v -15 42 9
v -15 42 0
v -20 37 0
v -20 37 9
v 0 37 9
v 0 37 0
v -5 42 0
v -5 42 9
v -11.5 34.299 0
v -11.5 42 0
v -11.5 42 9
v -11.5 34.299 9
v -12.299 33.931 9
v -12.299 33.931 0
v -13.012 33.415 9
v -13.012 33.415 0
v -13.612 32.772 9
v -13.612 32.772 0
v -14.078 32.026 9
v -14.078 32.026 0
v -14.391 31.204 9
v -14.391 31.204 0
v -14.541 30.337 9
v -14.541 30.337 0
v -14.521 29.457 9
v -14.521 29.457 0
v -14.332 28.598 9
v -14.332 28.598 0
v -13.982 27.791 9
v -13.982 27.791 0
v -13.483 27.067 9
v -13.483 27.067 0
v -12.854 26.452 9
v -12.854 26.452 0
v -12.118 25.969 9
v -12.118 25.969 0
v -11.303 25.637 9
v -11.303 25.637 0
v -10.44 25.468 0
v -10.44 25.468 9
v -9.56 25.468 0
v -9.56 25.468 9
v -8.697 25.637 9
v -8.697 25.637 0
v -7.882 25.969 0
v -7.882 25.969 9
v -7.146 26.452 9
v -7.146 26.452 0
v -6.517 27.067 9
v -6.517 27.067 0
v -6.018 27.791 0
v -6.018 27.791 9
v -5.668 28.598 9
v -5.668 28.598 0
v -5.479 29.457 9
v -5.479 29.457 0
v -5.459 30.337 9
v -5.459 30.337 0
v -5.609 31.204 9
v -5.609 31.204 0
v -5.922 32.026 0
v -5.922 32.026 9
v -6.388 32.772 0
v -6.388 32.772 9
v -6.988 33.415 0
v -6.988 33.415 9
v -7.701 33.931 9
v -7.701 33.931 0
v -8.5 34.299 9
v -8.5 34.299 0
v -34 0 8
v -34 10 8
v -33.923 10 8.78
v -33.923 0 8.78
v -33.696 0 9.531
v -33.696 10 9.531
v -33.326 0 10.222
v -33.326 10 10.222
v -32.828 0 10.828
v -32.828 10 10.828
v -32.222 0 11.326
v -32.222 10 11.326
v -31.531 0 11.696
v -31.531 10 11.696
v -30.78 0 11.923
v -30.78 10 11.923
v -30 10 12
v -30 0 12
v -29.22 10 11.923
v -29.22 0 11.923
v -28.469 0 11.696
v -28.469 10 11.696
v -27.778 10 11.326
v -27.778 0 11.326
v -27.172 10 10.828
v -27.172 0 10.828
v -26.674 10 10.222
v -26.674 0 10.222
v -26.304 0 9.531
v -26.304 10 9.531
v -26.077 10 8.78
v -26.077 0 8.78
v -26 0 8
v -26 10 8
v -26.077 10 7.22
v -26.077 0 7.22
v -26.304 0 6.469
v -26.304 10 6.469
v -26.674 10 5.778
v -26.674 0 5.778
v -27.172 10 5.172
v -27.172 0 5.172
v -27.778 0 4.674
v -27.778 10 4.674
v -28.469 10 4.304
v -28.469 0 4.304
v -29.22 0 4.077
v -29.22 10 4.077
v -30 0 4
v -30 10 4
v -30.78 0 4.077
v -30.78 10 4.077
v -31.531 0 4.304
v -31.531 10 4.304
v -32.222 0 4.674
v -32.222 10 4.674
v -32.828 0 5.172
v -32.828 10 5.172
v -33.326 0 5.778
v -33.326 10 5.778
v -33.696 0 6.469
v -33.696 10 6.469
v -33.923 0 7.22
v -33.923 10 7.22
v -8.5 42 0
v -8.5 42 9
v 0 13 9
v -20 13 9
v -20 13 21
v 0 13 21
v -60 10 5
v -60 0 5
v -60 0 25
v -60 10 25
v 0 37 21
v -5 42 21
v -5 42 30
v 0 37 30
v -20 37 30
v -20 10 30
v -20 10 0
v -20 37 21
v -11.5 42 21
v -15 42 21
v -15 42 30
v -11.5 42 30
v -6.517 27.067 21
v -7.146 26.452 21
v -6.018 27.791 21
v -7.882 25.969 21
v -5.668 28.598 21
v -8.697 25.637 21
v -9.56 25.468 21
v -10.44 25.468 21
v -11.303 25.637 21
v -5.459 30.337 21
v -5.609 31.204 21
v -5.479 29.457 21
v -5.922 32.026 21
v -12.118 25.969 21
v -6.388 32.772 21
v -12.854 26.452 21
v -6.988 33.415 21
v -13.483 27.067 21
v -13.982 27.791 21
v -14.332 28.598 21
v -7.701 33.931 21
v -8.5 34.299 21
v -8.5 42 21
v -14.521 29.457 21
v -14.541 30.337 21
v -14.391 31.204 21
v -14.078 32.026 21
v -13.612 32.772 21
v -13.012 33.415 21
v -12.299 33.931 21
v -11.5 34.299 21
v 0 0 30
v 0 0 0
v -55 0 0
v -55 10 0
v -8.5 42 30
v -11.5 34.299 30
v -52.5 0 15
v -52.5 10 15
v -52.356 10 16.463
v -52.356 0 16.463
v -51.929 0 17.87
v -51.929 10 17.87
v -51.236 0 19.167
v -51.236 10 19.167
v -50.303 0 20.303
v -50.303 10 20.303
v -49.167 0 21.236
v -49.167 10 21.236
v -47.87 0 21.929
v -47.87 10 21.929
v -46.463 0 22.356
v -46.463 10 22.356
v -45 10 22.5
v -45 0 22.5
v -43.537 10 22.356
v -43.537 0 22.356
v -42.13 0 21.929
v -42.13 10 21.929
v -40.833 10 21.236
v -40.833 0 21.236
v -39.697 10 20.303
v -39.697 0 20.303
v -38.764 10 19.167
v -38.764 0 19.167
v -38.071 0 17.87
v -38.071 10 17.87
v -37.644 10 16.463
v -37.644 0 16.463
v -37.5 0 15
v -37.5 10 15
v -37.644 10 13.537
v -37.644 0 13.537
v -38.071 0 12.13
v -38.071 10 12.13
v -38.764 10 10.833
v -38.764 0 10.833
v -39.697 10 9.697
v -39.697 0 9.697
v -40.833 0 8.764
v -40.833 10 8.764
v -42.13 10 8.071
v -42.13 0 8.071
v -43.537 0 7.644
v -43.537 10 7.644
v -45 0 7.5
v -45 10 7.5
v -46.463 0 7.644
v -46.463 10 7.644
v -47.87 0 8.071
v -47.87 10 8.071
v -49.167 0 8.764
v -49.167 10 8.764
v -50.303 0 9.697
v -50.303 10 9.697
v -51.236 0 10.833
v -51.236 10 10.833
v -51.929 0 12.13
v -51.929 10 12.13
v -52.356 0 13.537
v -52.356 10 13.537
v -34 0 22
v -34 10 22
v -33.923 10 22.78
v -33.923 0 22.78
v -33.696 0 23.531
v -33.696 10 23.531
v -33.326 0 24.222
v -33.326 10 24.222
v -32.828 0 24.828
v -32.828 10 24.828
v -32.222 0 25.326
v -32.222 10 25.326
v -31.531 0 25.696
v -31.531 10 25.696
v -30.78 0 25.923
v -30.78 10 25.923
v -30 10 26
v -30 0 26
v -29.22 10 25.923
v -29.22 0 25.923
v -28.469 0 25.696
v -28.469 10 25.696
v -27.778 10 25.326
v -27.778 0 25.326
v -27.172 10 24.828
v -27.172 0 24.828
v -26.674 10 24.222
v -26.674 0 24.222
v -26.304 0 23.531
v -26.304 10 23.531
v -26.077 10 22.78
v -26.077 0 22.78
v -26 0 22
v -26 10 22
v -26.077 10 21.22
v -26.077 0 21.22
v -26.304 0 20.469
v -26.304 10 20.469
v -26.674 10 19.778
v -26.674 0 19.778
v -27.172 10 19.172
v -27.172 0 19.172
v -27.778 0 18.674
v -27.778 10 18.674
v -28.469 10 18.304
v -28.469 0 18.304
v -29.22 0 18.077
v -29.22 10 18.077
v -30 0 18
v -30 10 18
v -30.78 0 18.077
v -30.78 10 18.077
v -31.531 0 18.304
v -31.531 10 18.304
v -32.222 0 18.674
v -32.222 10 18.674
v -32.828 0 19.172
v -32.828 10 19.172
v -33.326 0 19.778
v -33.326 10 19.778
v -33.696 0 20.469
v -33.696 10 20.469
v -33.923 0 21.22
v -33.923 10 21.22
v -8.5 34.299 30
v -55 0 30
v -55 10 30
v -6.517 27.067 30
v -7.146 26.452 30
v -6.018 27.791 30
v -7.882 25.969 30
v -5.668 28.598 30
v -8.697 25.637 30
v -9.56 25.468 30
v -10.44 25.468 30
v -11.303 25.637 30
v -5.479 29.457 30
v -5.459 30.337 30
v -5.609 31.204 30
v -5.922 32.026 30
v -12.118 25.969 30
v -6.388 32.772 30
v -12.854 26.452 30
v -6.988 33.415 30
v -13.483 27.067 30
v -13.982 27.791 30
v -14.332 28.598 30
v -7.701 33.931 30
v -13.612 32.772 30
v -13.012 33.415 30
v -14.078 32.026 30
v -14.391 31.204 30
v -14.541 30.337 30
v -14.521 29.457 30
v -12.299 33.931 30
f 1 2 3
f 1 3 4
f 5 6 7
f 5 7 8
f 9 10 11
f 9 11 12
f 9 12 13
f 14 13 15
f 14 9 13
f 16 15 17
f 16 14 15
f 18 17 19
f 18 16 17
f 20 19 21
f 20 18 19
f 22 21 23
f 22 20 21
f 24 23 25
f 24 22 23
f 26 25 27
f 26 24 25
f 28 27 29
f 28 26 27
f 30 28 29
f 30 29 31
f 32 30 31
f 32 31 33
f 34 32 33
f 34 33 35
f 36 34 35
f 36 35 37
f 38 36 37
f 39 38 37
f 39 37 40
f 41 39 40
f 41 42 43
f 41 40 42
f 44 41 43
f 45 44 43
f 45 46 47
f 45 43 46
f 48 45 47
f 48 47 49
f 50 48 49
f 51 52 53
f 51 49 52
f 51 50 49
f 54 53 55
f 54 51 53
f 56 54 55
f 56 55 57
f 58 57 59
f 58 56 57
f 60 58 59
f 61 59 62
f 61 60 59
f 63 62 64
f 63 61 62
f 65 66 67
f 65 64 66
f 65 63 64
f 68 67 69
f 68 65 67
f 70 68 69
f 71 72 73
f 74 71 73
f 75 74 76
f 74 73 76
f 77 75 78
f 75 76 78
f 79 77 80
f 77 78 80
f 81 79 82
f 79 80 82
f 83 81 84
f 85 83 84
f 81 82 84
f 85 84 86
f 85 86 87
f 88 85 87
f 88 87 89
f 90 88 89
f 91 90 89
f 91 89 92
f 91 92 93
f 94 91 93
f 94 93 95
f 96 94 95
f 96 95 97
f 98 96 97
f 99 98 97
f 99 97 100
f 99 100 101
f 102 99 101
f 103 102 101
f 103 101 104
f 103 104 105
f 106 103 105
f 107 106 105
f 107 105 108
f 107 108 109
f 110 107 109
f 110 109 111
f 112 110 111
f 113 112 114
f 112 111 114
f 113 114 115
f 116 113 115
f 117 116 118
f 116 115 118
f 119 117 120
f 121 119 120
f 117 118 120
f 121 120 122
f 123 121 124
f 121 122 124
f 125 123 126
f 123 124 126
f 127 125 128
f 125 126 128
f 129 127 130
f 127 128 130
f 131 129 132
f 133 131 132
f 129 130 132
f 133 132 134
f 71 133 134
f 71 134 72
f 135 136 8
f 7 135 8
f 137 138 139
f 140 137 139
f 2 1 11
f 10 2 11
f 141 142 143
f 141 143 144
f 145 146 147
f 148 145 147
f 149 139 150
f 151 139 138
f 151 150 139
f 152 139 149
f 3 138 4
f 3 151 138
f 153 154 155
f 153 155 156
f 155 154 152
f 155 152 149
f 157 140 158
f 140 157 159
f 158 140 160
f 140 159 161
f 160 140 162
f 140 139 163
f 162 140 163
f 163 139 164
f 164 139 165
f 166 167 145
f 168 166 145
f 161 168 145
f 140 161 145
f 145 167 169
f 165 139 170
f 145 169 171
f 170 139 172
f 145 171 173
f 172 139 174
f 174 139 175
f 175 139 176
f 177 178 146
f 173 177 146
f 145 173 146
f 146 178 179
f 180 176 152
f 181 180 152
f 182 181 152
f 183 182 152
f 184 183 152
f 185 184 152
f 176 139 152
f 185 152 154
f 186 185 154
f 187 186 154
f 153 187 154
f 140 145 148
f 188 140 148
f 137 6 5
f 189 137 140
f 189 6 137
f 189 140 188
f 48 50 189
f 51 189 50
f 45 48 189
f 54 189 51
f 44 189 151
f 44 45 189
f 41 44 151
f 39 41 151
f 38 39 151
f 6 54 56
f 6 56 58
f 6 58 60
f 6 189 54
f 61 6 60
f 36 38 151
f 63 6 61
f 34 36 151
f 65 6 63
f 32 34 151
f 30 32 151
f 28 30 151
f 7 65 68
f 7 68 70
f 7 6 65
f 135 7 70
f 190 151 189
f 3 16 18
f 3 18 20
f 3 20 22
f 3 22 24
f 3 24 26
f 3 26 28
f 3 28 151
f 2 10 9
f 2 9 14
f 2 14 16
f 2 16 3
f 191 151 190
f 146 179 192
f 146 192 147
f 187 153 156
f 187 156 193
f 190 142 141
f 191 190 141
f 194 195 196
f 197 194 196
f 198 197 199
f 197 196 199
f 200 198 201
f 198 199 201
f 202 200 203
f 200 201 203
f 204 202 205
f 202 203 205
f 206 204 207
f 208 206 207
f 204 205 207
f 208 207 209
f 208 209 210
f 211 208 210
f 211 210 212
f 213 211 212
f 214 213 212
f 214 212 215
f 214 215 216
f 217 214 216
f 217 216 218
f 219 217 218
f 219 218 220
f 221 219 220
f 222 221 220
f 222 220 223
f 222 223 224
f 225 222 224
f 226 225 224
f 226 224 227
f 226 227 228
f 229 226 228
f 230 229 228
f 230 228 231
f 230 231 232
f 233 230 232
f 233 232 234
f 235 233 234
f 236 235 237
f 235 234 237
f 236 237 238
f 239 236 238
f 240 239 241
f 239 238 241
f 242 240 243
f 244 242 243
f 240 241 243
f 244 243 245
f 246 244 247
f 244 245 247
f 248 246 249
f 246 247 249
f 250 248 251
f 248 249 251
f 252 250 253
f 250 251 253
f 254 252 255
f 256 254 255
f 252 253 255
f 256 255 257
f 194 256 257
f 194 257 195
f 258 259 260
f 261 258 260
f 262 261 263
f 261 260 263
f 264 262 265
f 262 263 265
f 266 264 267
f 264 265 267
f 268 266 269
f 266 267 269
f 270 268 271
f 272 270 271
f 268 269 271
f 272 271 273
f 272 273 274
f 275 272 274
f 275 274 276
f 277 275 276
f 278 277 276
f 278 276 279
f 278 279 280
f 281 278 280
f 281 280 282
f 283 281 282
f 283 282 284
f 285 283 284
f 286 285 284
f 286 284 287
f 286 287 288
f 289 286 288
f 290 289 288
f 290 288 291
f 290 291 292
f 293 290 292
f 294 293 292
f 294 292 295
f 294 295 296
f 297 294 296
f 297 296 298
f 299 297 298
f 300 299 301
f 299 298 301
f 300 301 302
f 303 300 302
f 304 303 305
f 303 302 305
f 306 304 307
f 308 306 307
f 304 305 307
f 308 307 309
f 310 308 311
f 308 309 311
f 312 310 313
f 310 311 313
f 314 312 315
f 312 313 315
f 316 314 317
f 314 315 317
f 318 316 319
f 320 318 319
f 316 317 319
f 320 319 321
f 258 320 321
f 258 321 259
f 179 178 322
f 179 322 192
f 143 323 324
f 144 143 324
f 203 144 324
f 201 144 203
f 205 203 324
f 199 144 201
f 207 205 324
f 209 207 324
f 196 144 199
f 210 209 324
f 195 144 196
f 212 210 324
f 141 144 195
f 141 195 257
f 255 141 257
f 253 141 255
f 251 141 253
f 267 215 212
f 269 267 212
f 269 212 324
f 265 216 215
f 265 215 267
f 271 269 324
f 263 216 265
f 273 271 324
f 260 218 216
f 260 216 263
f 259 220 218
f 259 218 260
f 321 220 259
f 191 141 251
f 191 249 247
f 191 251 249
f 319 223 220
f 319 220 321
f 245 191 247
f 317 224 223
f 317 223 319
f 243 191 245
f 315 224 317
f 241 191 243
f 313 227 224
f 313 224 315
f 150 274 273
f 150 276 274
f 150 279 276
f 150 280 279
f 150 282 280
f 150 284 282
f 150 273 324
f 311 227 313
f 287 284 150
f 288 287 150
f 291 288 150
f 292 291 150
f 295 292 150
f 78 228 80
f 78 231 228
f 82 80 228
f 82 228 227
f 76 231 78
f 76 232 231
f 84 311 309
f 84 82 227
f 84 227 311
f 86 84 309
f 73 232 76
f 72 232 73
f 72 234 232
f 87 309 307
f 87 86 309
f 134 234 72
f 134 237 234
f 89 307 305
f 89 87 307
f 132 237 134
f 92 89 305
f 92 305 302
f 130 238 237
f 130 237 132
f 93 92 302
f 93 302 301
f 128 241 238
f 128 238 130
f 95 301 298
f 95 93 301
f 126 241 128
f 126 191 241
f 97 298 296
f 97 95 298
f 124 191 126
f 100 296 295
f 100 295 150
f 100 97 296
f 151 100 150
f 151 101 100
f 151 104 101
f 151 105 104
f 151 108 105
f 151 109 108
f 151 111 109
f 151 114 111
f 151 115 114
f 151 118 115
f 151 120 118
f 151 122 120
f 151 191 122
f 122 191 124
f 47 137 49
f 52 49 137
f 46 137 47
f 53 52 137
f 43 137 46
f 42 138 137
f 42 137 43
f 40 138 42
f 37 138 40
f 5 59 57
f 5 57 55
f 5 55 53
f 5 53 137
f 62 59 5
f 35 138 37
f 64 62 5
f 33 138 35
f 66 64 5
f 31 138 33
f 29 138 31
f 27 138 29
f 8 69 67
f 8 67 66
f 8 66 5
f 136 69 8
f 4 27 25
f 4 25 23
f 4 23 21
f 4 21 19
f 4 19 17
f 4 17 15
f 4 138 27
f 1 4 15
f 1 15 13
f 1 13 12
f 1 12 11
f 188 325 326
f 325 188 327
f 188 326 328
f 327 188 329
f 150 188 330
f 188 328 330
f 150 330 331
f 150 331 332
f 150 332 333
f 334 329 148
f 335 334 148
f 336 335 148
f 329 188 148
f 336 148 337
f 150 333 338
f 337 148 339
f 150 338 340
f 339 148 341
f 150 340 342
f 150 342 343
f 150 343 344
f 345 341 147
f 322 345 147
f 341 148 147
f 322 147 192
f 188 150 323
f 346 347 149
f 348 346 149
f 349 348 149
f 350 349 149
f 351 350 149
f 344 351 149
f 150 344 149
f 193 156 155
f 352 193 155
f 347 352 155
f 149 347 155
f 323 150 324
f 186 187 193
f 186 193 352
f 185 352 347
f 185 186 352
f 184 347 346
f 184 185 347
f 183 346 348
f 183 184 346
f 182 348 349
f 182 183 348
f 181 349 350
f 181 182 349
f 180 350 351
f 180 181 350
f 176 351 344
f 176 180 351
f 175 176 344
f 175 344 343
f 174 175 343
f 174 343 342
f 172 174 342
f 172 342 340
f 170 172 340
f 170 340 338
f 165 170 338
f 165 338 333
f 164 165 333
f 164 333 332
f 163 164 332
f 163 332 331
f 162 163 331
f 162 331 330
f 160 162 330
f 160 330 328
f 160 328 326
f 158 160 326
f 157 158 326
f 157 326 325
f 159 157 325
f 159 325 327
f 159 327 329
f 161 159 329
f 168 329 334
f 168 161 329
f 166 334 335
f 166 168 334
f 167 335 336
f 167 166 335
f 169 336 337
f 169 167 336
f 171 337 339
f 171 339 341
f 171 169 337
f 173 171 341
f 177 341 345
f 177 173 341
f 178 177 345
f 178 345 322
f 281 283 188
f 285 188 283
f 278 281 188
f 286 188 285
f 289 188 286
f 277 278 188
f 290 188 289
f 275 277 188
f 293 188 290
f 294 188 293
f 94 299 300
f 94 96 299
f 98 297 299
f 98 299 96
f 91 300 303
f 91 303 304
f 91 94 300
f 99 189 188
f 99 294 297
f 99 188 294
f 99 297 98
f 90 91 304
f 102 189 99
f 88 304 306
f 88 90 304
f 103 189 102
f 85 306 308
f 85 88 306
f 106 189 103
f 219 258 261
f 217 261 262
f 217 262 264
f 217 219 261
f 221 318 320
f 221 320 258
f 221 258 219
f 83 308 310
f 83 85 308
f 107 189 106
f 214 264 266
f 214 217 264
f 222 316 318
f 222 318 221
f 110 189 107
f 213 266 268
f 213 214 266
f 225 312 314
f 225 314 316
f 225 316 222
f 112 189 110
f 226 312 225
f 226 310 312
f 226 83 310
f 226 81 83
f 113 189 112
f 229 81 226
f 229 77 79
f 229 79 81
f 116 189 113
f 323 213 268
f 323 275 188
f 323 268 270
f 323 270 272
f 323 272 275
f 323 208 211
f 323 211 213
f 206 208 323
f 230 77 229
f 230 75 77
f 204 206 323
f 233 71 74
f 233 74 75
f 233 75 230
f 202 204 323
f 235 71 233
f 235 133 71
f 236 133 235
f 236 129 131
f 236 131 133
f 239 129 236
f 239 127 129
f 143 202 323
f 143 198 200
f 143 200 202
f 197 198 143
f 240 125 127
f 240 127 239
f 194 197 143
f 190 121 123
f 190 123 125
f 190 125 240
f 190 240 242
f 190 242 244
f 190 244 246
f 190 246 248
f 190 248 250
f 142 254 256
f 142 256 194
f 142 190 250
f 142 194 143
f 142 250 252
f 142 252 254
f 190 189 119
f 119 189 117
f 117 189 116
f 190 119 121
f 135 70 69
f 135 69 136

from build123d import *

# Parameters (mm, degrees)
BOSS_EXTRUDE1_DEPTH = 30
SKETCH2_R           = 7.5
SKETCH2_R_2         = 4
CUT_EXTRUDE1_DEPTH  = 75.323616704
SKETCH3_W           = 12
SKETCH3_H           = 29
CUT_EXTRUDE2_DEPTH  = 66.299310869
CHAMFER1_SIZE       = 5


with BuildPart() as part:
    # Sketch1 → Boss-Extrude1 (new body)
    with BuildSketch(Plane.XY):
        with BuildLine():
            ThreePointArc((-11.5, 34.299335699), (-10, 25.446508213), (-8.5, 34.299335699))
            Line((-8.5, 34.299335699), (-8.5, 42))
            Line((-8.5, 42), (0, 42))
            Line((0, 42), (0, 0))
            Line((0, 0), (-60, 0))
            Line((-60, 0), (-60, 10))
            Line((-60, 10), (-20, 10))
            Line((-20, 10), (-20, 42))
            Line((-20, 42), (-11.5, 42))
            Line((-11.5, 42), (-11.5, 34.299335699))
        make_face()
    extrude(amount=BOSS_EXTRUDE1_DEPTH)

    # Sketch2 → Cut-Extrude1 (cut, through all)
    with BuildSketch(Plane(origin=(0, 10, 0), x_dir=(1, 0, 0), z_dir=(0, 1, 0))):
        with Locations(Location((-45, -15, 0), (0, 0, 180))):
            Circle(SKETCH2_R)
        with Locations(Location((-30, -8, 0), (0, 0, 180))):
            Circle(SKETCH2_R_2)
        with Locations(Location((-30, -22, 0), (0, 0, 180))):
            Circle(SKETCH2_R_2)
    extrude(amount=-CUT_EXTRUDE1_DEPTH, mode=Mode.SUBTRACT)

    # Sketch3 → Cut-Extrude2 (cut, through all)
    with BuildSketch(Plane.ZY.offset(20)):
        with Locations((15, 27.5)):
            Rectangle(SKETCH3_W, SKETCH3_H)
    extrude(amount=-CUT_EXTRUDE2_DEPTH, mode=Mode.SUBTRACT)

    # Chamfer1
    chamfer1_edges = [part.edges().sort_by_distance(p)[0] for p in [
        (-60, 5, 0),
        (0, 42, 25.5),
        (-20, 42, 25.5),
        (-60, 5, 30),
        (0, 42, 4.5),
        (-20, 42, 4.5),
    ]]
    chamfer(chamfer1_edges, length=CHAMFER1_SIZE)


solid = part.part
